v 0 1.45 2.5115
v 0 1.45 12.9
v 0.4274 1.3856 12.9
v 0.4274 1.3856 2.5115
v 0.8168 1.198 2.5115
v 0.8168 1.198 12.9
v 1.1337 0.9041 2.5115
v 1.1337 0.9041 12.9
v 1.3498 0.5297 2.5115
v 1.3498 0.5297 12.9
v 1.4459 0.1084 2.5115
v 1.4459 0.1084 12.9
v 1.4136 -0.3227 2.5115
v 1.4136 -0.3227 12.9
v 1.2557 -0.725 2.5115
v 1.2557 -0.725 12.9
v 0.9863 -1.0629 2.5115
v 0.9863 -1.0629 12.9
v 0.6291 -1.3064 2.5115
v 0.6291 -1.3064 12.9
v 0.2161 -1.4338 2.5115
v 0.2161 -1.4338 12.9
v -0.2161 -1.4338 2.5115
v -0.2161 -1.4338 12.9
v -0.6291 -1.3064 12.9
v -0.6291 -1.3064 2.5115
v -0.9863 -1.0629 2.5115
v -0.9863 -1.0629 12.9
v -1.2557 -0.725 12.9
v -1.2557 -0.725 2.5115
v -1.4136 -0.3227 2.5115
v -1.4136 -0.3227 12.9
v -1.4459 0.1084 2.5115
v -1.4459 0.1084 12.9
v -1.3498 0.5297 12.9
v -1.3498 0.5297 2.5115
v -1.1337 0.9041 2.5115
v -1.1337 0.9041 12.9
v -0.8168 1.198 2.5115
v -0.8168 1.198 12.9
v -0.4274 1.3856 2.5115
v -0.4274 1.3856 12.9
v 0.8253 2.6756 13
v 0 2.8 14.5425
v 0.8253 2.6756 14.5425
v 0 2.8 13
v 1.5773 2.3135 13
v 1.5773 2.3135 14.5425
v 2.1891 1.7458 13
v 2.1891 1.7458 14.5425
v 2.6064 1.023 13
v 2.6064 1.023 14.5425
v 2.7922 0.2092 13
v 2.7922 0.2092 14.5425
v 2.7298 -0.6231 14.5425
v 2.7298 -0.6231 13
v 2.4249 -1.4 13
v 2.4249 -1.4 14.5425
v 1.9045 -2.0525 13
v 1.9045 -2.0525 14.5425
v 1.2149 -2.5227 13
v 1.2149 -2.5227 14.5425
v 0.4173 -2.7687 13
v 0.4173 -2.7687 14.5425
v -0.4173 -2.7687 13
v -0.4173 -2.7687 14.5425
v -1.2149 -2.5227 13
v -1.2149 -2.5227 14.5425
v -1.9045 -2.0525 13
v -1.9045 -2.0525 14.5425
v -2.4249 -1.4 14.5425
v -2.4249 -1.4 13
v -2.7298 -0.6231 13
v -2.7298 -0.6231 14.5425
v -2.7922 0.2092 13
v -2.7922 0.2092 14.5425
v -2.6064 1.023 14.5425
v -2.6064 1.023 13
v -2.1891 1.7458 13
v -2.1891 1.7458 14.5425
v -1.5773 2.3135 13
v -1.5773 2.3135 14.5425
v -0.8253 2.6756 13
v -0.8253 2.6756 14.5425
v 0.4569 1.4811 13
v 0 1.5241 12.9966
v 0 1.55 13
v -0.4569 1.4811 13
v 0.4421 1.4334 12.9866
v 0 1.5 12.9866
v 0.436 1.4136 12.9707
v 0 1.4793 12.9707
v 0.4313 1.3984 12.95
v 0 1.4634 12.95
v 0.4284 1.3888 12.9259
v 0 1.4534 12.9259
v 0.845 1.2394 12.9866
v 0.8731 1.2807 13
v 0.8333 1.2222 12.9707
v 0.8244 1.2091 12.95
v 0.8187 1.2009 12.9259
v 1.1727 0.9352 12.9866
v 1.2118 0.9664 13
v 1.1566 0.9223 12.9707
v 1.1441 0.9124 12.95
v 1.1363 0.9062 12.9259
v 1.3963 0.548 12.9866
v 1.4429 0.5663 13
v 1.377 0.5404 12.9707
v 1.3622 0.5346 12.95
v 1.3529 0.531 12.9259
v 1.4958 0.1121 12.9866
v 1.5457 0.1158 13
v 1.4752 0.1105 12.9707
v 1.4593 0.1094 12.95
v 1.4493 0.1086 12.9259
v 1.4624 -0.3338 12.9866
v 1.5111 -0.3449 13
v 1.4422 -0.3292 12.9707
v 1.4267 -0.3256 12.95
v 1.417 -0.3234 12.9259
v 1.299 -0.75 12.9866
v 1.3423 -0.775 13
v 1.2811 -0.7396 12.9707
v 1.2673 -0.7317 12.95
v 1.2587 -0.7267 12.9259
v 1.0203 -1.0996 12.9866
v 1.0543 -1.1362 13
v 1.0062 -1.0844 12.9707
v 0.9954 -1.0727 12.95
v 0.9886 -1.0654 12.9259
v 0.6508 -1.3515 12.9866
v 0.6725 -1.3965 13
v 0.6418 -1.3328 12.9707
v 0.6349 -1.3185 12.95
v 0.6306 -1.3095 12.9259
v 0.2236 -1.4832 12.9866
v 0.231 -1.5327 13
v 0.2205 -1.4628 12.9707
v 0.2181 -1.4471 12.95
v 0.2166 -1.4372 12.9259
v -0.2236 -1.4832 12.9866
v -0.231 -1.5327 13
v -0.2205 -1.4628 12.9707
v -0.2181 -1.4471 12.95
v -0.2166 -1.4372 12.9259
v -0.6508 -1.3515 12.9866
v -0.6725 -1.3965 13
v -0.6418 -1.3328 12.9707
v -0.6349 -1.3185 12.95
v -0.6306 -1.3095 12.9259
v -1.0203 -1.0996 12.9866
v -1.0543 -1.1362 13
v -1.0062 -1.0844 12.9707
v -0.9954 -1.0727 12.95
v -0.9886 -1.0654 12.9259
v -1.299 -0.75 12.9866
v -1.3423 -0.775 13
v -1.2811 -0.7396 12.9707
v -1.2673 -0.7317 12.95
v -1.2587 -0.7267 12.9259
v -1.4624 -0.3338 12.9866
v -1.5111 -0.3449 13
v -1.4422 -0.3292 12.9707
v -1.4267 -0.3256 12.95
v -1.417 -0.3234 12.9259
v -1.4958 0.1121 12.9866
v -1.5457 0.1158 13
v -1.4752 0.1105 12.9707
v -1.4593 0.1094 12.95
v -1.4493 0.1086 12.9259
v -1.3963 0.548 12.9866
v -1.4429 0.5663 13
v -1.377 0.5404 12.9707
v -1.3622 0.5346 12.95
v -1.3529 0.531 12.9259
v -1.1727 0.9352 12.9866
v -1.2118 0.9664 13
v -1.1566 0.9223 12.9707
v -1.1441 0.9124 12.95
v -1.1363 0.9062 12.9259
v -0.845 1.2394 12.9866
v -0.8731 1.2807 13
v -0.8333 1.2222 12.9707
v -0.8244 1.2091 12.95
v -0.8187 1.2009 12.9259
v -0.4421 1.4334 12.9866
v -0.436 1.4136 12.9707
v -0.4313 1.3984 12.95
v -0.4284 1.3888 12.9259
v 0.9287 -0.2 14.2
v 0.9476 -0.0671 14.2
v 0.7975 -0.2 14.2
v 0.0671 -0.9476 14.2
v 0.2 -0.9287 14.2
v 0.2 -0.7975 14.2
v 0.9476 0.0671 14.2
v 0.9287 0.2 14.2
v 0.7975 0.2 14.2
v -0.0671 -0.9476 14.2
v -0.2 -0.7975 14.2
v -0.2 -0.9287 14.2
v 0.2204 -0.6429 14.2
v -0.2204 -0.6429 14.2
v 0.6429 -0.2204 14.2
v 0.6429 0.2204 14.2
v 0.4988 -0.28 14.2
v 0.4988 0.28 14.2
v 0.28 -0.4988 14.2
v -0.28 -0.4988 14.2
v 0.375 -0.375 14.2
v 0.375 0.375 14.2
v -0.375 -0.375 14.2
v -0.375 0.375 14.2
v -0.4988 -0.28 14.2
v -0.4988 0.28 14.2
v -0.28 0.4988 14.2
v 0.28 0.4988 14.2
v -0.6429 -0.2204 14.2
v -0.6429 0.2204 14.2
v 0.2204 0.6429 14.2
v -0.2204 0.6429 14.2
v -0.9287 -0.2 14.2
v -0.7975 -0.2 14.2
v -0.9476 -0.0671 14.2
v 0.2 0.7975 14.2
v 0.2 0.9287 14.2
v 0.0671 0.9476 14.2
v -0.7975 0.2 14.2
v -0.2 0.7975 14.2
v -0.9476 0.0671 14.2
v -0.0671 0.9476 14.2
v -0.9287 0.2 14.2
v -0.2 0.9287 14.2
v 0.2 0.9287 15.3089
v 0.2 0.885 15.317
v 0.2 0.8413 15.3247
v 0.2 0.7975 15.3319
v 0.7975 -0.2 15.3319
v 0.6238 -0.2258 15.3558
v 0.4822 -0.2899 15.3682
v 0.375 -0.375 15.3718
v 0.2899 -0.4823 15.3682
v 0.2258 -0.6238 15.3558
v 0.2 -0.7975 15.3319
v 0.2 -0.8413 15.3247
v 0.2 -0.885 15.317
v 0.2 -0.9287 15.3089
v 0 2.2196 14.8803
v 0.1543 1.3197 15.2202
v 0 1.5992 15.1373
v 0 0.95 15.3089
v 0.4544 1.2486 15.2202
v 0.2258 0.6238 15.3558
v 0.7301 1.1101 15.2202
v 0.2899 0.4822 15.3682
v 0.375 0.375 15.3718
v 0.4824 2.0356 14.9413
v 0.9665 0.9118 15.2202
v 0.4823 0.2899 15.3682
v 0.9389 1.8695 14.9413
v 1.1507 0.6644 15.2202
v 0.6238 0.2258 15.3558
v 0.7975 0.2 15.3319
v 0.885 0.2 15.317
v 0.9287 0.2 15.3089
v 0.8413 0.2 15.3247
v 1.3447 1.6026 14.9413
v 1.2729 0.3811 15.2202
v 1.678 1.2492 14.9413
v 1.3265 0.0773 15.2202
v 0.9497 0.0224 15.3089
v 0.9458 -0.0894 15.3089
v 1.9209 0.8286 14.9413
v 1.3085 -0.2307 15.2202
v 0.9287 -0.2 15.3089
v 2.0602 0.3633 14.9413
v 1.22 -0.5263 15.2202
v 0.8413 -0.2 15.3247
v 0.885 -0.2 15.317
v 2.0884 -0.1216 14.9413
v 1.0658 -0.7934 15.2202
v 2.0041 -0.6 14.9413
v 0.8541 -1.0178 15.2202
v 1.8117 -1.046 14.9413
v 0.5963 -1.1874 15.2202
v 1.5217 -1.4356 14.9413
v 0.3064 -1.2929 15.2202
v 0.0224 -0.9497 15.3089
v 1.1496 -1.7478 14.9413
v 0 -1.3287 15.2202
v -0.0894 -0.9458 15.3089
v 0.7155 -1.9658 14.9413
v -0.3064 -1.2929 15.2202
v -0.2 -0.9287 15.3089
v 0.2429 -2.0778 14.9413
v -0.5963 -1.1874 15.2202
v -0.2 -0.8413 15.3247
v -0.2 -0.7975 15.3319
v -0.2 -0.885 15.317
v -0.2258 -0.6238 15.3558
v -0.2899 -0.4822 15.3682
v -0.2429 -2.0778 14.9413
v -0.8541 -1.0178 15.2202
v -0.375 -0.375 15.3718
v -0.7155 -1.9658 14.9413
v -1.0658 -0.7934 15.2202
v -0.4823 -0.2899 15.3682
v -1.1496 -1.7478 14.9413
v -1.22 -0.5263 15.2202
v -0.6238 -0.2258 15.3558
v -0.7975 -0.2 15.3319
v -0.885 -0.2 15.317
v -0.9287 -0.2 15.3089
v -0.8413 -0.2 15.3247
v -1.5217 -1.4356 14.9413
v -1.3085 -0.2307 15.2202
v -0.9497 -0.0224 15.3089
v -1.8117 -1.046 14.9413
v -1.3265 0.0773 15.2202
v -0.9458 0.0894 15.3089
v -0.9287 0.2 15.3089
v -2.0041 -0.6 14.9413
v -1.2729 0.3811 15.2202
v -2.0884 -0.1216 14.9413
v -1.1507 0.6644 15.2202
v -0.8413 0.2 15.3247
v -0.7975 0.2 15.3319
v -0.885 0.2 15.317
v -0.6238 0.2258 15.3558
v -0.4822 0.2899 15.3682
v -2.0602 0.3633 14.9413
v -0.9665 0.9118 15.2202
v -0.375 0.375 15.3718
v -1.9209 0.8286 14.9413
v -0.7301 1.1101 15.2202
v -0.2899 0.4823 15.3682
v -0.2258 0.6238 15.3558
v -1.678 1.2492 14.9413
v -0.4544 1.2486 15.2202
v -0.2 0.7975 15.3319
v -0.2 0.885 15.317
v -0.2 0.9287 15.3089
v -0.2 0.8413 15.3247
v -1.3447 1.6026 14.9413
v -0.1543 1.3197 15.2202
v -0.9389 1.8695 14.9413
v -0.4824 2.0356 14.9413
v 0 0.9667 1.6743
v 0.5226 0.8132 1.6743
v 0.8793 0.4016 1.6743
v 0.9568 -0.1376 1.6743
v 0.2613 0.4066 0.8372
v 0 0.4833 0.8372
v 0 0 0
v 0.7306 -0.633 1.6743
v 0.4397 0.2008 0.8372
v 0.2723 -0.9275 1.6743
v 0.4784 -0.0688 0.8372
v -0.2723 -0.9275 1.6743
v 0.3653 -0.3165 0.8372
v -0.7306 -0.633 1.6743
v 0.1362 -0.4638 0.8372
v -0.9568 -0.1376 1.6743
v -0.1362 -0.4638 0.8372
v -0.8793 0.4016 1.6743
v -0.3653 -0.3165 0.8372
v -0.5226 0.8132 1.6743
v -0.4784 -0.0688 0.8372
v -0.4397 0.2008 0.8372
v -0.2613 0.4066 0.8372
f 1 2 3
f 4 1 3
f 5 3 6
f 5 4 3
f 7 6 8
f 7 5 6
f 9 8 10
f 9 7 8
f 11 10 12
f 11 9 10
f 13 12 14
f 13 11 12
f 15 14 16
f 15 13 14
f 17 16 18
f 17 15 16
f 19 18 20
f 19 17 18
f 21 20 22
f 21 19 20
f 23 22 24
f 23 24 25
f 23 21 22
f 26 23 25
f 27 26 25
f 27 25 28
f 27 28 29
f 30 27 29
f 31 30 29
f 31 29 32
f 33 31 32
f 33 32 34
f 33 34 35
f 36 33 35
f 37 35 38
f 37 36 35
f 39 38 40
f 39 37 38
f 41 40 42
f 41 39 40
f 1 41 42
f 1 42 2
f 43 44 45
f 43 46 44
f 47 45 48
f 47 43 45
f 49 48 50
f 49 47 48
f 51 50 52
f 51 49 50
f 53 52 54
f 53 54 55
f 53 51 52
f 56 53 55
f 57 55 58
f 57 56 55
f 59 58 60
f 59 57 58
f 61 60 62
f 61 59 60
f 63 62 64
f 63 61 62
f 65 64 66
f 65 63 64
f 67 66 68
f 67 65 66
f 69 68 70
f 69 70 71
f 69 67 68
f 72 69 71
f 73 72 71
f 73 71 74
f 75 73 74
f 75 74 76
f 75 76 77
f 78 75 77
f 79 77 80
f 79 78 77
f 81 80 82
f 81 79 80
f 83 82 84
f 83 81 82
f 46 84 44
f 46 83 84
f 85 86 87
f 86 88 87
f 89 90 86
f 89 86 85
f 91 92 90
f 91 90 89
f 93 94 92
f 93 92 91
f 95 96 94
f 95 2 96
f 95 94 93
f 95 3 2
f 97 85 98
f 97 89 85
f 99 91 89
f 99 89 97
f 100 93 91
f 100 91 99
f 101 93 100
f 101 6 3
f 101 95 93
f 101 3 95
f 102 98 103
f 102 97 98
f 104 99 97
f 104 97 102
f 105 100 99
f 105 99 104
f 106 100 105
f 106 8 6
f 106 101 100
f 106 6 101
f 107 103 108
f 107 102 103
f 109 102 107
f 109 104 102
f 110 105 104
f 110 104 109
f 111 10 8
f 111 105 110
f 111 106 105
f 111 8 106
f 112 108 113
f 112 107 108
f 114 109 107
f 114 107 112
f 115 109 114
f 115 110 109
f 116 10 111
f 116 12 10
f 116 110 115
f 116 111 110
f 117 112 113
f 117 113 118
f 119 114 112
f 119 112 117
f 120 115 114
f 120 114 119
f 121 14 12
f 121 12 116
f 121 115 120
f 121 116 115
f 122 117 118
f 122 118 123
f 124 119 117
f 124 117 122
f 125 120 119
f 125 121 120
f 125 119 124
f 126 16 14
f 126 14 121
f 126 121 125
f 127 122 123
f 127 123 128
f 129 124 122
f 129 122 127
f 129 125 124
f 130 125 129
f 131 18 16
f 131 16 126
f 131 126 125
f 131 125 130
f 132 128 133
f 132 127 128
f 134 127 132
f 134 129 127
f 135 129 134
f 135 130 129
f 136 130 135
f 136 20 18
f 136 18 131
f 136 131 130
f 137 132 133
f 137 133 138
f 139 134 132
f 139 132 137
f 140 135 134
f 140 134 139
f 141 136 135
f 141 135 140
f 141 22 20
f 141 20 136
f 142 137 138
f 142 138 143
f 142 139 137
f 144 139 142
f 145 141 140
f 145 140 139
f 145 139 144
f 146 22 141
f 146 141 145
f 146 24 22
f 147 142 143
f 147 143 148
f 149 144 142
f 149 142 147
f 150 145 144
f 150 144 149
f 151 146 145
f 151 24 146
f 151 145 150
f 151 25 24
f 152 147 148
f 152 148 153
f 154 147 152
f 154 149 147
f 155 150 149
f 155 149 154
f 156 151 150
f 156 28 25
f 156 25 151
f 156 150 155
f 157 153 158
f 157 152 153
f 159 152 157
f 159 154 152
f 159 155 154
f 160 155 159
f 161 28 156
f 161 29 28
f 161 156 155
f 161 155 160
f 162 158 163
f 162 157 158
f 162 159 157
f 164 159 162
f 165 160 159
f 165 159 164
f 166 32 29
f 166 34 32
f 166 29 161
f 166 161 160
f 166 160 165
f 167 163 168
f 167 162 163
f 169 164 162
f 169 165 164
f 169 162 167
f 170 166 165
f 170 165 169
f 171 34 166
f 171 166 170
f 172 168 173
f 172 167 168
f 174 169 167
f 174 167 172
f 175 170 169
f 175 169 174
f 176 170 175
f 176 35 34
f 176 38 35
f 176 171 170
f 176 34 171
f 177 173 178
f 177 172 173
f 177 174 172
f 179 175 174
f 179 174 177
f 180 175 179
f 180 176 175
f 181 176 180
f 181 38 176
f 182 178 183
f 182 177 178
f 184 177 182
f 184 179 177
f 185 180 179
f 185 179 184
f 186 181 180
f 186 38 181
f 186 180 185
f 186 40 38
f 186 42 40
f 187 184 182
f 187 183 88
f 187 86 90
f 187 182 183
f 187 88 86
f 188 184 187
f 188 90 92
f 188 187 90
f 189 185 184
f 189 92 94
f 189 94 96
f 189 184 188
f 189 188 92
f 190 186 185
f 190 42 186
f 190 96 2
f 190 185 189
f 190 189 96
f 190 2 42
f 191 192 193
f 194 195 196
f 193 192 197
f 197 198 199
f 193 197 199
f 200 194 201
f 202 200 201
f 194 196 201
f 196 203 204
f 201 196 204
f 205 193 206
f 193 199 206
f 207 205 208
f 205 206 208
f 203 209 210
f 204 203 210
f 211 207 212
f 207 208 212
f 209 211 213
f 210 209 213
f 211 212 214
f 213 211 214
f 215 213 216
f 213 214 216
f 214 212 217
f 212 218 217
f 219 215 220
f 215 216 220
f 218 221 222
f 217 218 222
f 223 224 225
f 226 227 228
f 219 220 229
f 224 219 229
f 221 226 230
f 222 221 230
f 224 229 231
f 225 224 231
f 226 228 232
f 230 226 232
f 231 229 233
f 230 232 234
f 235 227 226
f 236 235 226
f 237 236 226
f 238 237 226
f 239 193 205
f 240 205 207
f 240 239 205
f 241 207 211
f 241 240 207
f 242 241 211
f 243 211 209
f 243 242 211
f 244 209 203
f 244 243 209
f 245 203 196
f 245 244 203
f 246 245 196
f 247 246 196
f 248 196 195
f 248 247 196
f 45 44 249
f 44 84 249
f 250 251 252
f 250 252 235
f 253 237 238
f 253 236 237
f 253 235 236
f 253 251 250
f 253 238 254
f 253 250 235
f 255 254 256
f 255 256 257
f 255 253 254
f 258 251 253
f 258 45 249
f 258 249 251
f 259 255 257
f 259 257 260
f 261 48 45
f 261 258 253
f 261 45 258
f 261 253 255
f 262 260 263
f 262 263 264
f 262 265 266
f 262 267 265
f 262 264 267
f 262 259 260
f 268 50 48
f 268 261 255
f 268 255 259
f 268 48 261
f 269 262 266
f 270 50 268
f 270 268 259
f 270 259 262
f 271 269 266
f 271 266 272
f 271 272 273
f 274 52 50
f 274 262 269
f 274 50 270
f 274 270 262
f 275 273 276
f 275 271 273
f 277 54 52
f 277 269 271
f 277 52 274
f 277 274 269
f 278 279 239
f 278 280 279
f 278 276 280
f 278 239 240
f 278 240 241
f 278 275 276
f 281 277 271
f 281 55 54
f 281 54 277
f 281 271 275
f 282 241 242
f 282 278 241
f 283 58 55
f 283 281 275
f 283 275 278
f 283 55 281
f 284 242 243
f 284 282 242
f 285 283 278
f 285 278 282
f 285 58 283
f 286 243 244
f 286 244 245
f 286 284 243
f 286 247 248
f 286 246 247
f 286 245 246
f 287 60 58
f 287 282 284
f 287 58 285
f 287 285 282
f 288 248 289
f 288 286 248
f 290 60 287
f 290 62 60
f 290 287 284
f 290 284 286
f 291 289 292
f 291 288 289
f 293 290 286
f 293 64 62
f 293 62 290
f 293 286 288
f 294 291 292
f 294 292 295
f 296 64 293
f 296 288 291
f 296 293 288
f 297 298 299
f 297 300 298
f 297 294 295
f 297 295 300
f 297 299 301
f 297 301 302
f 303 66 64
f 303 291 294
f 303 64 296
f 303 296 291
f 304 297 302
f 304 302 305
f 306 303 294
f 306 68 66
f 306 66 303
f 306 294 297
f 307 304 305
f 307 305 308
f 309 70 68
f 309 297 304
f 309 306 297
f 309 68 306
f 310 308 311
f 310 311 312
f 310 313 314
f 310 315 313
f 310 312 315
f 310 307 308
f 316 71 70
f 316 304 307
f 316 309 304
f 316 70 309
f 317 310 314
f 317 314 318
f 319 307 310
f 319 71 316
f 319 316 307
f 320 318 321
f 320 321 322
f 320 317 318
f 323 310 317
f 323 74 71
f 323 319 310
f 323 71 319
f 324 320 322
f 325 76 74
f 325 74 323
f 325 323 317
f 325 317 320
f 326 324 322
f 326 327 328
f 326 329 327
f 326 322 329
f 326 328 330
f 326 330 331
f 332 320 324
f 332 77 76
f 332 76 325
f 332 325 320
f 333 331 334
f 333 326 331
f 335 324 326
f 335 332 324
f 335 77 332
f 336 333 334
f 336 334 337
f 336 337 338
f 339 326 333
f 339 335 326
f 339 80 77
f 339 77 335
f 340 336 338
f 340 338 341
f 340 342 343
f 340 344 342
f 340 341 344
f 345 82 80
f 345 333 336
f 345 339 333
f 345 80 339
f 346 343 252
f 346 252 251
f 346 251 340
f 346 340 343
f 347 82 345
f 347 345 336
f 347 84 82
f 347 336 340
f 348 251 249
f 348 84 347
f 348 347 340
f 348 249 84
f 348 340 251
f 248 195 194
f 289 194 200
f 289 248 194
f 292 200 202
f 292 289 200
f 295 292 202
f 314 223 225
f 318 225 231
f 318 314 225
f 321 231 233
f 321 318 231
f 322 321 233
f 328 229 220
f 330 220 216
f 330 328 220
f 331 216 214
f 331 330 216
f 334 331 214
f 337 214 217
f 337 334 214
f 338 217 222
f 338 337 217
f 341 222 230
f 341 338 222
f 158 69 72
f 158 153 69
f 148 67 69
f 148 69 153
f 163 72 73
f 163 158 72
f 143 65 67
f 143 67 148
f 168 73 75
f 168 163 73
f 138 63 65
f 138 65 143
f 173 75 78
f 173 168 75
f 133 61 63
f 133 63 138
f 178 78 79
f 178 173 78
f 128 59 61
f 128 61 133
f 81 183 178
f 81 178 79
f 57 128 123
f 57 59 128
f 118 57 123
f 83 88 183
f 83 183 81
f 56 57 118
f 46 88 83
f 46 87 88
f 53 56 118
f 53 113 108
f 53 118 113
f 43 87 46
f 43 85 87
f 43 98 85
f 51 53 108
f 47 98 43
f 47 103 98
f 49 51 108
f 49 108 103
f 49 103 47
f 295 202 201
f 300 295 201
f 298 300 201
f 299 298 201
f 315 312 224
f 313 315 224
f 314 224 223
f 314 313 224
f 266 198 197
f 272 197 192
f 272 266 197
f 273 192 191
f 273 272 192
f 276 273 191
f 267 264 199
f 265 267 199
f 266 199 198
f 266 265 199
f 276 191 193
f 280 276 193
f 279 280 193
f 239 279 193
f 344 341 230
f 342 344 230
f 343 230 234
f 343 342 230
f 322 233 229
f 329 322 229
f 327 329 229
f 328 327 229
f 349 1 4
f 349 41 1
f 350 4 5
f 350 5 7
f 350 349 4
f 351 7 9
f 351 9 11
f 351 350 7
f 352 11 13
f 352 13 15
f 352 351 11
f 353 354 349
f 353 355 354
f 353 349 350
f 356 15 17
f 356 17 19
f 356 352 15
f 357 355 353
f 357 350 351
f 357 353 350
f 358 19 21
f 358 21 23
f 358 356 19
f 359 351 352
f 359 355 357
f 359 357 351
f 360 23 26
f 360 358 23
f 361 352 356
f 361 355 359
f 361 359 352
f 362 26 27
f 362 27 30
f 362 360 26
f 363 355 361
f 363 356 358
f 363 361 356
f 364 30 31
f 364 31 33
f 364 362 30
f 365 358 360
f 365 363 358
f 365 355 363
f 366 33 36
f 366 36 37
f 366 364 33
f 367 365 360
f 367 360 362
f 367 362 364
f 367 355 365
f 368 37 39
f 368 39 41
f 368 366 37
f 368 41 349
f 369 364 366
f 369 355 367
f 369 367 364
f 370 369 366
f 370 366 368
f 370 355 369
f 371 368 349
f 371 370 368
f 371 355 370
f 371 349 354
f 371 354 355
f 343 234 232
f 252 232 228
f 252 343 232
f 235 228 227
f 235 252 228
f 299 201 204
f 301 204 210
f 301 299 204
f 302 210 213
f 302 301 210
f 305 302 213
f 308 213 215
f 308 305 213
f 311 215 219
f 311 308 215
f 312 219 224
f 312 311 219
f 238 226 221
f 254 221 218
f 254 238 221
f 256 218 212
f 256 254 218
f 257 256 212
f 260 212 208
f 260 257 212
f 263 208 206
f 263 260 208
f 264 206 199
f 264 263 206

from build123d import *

# Parameters (mm, degrees)
CUT_EXTRUDE_2_DEPTH = 1.2
FILLET_1_R          = 0.1


with BuildPart() as part:
    # 草图8 → Revolve 1380 (revolve)
    with BuildSketch(Plane(origin=(0, 0, 0), x_dir=(0, 0, -1), z_dir=(1, 0, 0))):
        with BuildLine():
            Line((0, 0), (-15.4, 0))
            ThreePointArc((-15.4, 0), (-15.180811394, 1.464186604), (-14.542463035, 2.8))
            Line((-14.542463035, 2.8), (-13, 2.8))
            Line((-13, 2.8), (-13, 1.45))
            Line((-13, 1.45), (-2.511473671, 1.45))
            Line((-2.511473671, 1.45), (0, 0))
        make_face()
    revolve(axis=Axis((0, 0, 11.71), (0, 0, -1)))

    # 草图7 → 切除-拉伸2 (cut)
    with BuildSketch(Plane.XY.offset(15.4)):
        with BuildLine():
            Line((0.2, 0.928708781), (0.2, 0.797500009))
            ThreePointArc((0.2, 0.797500009), (0.375003701, 0.375003701), (0.797500009, 0.2))
            Line((0.797500009, 0.2), (0.928708781, 0.2))
            ThreePointArc((0.928708781, 0.2), (0.95, 0), (0.928708781, -0.2))
            Line((0.928708781, -0.2), (0.797500009, -0.2))
            ThreePointArc((0.797500009, -0.2), (0.375003701, -0.375003701), (0.2, -0.797500009))
            Line((0.2, -0.797500009), (0.2, -0.928708781))
            ThreePointArc((0.2, -0.928708781), (0, -0.95), (-0.2, -0.928708781))
            Line((-0.2, -0.928708781), (-0.2, -0.797500009))
            ThreePointArc((-0.2, -0.797500009), (-0.375003701, -0.375003701), (-0.797500009, -0.2))
            Line((-0.797500009, -0.2), (-0.928708781, -0.2))
            ThreePointArc((-0.928708781, -0.2), (-0.95, 0), (-0.928708781, 0.2))
            Line((-0.928708781, 0.2), (-0.797500009, 0.2))
            ThreePointArc((-0.797500009, 0.2), (-0.375003701, 0.375003701), (-0.2, 0.797500009))
            Line((-0.2, 0.797500009), (-0.2, 0.928708781))
            ThreePointArc((-0.2, 0.928708781), (0, 0.95), (0.2, 0.928708781))
        make_face()
    extrude(amount=-CUT_EXTRUDE_2_DEPTH, mode=Mode.SUBTRACT)

    # 圆角1
    fillet_1_edges = [part.edges().sort_by_distance(p)[0] for p in [
        (0, -1.45, 13),
    ]]
    fillet(fillet_1_edges, radius=FILLET_1_R)


solid = part.part
